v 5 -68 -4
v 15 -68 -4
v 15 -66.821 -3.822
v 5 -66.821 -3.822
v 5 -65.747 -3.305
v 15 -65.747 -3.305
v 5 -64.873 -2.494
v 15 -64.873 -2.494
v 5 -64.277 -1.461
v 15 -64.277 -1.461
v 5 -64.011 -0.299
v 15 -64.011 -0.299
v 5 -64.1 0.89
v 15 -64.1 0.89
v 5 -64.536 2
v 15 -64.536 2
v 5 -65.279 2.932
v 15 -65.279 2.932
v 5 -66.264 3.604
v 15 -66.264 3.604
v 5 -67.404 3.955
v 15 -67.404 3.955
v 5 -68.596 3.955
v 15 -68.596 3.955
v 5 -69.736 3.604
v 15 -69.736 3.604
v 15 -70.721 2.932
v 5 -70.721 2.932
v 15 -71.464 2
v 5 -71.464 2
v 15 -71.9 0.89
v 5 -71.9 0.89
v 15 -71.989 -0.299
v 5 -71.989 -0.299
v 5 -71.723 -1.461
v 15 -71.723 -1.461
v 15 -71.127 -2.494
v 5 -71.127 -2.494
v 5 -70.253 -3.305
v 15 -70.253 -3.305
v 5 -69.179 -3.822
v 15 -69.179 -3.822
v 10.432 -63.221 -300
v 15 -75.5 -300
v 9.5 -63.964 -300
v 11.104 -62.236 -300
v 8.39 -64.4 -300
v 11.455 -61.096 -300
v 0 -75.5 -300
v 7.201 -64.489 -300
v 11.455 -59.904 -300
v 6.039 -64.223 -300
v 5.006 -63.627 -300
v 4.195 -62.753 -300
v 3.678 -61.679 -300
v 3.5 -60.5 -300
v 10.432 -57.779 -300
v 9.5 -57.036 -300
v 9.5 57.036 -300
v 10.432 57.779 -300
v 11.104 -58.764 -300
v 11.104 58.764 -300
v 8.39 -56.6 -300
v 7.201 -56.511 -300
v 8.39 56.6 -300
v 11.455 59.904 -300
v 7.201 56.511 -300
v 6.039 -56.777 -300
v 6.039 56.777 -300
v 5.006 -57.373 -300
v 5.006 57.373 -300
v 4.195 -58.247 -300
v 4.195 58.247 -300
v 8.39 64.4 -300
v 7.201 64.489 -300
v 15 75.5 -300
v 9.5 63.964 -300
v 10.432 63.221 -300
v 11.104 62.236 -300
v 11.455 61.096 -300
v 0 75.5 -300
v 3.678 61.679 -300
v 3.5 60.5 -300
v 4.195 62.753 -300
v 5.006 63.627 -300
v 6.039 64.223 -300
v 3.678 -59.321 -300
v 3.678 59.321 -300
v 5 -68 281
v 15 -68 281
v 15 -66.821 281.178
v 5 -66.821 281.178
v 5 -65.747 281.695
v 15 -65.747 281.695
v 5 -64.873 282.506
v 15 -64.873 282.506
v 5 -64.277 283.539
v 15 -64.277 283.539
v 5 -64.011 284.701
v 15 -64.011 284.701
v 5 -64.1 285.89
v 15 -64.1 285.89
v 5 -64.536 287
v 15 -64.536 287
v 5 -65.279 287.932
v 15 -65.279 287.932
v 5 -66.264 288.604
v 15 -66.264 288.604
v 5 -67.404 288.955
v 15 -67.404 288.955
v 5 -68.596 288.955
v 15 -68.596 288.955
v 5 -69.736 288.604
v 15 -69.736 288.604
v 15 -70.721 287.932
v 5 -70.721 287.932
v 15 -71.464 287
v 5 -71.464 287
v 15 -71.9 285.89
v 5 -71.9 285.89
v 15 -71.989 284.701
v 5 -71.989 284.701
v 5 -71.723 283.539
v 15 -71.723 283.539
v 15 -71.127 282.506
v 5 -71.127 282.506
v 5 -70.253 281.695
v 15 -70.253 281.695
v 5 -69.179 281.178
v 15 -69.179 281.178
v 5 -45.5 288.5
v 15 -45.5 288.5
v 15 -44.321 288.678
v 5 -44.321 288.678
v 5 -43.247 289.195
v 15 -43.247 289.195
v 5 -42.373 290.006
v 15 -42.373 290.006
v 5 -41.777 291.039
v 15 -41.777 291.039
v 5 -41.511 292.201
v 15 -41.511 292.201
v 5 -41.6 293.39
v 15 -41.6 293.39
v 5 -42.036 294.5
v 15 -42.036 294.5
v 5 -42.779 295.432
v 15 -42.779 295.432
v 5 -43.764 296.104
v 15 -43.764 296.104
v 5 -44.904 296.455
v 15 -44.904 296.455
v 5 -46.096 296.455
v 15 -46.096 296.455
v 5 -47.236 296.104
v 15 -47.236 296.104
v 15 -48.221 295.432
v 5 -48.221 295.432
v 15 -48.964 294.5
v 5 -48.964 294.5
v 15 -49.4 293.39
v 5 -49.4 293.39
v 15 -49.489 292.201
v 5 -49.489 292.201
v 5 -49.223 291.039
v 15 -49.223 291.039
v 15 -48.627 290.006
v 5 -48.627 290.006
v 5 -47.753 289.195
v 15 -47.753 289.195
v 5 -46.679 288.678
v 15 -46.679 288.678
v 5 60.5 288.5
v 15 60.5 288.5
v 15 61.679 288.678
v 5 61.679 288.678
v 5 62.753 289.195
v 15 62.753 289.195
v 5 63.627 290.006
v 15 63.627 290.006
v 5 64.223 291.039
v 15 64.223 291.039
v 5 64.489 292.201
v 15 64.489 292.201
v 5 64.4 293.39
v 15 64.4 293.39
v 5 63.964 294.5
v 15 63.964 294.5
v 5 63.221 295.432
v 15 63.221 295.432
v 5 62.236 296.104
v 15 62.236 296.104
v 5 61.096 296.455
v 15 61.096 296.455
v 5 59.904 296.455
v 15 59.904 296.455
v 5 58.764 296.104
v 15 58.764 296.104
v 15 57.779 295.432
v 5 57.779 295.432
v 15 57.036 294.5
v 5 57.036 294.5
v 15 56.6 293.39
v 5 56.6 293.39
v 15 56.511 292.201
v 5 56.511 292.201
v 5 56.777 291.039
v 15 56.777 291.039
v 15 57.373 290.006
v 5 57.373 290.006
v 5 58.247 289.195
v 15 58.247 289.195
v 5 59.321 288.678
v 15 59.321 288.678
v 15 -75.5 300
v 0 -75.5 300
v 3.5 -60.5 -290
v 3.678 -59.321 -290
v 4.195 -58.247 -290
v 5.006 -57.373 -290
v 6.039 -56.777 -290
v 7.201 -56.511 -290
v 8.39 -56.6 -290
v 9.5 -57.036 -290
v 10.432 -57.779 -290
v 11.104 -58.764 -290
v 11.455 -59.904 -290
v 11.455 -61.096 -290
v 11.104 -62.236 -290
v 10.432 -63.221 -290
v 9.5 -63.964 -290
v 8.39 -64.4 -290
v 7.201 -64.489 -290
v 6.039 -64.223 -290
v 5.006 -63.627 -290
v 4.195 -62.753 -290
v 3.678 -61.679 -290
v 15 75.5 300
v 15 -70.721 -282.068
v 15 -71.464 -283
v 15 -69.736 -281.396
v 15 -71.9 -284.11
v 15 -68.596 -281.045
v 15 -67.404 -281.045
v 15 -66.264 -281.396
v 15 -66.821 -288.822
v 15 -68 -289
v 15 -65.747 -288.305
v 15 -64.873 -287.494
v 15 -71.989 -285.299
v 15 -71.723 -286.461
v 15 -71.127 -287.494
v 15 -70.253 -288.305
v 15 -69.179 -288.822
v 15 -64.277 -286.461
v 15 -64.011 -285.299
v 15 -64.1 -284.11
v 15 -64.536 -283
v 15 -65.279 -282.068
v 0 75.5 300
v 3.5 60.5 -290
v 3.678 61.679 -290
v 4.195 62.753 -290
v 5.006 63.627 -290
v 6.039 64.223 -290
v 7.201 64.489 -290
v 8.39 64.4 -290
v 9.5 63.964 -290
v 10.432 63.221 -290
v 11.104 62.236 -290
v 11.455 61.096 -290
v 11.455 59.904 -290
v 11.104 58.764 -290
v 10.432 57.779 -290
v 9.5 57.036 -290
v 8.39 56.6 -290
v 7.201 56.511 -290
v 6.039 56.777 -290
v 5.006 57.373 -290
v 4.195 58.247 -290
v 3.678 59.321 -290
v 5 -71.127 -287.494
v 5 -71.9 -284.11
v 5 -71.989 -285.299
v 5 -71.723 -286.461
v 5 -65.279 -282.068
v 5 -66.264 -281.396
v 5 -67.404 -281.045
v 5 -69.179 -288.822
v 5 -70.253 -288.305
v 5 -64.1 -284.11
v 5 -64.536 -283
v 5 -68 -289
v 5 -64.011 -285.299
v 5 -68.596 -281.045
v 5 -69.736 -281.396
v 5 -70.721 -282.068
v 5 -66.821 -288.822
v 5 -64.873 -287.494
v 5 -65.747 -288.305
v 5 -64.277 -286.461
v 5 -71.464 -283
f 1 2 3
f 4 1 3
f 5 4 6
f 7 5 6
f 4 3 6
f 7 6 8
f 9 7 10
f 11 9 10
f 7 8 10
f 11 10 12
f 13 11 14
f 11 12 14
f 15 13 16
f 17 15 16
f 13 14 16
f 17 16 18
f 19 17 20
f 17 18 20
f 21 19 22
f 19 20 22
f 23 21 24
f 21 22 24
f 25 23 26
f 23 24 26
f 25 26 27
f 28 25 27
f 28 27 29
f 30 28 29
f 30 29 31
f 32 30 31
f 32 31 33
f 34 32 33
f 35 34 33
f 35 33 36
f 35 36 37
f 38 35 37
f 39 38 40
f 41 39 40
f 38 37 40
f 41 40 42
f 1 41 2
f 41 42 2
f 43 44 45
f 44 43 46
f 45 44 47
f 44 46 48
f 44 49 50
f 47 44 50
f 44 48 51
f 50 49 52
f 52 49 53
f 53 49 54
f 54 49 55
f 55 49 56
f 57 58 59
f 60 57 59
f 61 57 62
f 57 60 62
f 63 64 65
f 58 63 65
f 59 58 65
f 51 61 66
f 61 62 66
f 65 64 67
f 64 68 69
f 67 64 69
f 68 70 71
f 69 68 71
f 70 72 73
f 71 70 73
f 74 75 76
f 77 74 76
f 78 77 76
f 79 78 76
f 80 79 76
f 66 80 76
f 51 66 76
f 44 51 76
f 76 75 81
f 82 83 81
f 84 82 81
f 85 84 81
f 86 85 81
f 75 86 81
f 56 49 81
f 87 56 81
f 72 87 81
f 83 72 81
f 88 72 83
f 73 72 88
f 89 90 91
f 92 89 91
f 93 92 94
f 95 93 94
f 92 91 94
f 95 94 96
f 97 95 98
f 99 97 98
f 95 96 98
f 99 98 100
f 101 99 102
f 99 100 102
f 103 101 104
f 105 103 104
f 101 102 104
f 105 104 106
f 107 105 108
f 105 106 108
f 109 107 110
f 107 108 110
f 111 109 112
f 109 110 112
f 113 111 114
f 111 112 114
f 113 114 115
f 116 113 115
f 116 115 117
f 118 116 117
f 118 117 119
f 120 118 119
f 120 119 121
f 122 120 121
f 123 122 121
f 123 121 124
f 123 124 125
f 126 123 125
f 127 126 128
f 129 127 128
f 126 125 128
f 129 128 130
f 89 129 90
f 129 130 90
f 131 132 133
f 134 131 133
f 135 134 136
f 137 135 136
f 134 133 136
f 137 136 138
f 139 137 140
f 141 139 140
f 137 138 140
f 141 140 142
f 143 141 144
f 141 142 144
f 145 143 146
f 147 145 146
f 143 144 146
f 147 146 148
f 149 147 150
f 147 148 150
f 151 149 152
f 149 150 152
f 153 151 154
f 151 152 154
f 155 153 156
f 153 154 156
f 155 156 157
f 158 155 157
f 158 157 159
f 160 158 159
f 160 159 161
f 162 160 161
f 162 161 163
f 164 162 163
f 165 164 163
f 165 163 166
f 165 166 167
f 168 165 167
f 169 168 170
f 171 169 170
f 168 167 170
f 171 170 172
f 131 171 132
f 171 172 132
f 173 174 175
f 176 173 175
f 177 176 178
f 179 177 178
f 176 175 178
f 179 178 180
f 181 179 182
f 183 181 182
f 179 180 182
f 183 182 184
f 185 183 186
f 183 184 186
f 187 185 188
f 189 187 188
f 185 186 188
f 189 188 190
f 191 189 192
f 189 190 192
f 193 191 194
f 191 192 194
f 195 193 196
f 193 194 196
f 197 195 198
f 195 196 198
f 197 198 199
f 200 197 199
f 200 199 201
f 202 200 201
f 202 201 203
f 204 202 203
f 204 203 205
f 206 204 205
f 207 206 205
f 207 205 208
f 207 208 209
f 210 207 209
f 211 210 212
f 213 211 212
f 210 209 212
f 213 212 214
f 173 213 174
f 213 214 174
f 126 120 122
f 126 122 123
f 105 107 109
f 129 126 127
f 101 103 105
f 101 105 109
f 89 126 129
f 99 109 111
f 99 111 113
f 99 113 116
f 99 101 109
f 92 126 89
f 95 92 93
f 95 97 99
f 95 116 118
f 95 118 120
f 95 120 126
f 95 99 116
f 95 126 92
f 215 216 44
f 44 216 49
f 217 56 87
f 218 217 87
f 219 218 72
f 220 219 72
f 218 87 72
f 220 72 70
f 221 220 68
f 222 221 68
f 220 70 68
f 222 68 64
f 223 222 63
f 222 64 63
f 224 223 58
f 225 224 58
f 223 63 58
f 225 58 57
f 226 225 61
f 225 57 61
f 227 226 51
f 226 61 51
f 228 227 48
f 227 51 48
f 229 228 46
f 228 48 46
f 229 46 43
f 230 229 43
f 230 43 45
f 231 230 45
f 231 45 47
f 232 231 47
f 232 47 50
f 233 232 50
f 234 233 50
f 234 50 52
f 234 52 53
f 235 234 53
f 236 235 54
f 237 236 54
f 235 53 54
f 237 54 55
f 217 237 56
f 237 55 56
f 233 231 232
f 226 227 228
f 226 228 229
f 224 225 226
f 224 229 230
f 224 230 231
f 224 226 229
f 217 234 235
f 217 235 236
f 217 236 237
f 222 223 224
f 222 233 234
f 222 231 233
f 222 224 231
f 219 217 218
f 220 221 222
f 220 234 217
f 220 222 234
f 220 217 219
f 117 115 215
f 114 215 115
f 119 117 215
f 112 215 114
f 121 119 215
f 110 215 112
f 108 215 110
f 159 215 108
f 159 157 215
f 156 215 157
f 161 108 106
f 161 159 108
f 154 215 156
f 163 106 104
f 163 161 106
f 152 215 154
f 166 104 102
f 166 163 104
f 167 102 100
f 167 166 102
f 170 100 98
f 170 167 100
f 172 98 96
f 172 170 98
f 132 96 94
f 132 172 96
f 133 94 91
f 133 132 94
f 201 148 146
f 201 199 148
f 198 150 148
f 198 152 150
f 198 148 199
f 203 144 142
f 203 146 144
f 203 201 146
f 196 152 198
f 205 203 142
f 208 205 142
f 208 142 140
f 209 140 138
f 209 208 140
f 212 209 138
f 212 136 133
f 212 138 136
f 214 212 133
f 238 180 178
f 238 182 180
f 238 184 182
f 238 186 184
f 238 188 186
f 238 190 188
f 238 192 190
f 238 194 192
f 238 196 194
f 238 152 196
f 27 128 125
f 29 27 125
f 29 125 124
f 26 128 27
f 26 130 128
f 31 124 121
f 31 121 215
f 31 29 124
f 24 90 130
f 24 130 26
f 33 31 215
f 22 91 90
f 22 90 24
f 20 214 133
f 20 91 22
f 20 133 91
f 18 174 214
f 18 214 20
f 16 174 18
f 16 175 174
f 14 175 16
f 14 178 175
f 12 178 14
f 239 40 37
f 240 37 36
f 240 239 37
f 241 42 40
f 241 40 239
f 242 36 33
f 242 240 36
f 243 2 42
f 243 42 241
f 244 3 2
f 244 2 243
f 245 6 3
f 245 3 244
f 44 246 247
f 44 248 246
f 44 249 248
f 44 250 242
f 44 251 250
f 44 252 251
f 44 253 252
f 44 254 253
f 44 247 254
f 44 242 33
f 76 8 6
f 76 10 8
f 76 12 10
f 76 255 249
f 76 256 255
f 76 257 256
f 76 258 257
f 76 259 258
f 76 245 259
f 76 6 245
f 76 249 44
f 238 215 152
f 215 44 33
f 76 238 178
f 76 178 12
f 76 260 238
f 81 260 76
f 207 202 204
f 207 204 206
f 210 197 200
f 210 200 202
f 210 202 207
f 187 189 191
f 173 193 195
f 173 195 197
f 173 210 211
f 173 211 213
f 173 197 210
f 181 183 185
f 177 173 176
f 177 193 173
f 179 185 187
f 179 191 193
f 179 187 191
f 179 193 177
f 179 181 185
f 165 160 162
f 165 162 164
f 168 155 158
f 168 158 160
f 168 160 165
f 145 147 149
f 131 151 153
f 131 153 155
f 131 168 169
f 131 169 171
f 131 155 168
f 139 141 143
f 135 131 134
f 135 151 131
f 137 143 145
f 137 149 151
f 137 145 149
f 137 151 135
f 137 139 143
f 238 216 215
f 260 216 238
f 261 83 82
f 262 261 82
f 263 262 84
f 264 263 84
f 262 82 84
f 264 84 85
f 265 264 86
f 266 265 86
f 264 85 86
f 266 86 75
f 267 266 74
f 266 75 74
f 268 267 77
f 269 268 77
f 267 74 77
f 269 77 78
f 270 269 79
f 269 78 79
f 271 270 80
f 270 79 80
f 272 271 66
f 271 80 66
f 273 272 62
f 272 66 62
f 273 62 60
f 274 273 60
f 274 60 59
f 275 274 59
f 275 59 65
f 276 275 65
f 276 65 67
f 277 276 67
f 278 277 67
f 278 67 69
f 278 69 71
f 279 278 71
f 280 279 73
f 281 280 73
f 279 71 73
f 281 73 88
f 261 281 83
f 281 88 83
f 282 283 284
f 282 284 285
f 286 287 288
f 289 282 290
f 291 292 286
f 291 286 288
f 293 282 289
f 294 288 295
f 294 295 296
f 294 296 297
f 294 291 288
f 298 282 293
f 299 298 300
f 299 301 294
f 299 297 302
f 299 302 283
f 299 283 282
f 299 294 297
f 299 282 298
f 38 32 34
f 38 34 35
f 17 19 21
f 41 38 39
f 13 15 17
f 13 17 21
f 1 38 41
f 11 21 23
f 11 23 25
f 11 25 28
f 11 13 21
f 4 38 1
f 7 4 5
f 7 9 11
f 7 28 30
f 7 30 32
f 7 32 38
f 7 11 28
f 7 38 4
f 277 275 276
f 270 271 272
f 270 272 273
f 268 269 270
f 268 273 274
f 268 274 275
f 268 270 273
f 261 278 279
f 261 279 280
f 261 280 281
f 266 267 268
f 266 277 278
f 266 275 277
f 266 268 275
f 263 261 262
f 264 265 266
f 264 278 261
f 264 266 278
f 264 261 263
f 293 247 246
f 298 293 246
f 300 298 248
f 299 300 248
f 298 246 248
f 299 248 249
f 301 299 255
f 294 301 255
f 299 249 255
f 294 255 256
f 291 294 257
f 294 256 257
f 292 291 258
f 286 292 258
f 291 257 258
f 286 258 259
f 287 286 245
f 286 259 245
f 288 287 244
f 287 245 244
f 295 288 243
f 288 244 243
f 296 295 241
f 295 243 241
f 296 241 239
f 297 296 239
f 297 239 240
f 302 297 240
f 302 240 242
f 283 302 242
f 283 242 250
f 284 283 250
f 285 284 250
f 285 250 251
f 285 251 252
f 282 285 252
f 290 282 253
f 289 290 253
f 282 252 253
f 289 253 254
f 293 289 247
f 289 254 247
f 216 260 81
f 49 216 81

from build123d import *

# Parameters (mm, degrees)
SKETCH1_W           = 600
SKETCH1_H           = 151
BOSS_EXTRUDE1_DEPTH = 15
SKETCH2_R           = 4
CUT_EXTRUDE1_DEPTH  = 10
SKETCH2_3_R         = 4
CUT_EXTRUDE2_DEPTH  = 10
LPATTERN1_COUNT     = 3
LPATTERN1_PITCH     = 285
LPATTERN2_COUNT     = 2
LPATTERN2_PITCH     = 106
SKETCH5_R           = 4
CUT_EXTRUDE5_DEPTH  = 10
LPATTERN5_COUNT     = 2
LPATTERN5_PITCH     = 121


with BuildPart() as part:
    # Sketch1 → Boss-Extrude1 (new body)
    with BuildSketch(Plane(origin=(0, 0, 0), x_dir=(0, 0, -1), z_dir=(1, 0, 0))):
        Rectangle(SKETCH1_W, SKETCH1_H)
    extrude(amount=BOSS_EXTRUDE1_DEPTH)

    # Sketch2 → Cut-Extrude1 (cut)
    with BuildSketch(Plane(origin=(15, 0, 0), x_dir=(0, 0, -1), z_dir=(1, 0, 0))):
        with Locations((285, -68)):
            Circle(SKETCH2_R)
    cut_extrude1 = extrude(amount=-CUT_EXTRUDE1_DEPTH, mode=Mode.SUBTRACT)

    # Sketch2<3> → Cut-Extrude2 (cut)
    with BuildSketch(Plane(origin=(15, 0, 0), x_dir=(0, 0, -1), z_dir=(1, 0, 0))):
        with Locations((-292.5, 60.5)):
            Circle(SKETCH2_3_R)
    cut_extrude2 = extrude(amount=-CUT_EXTRUDE2_DEPTH, mode=Mode.SUBTRACT)

    # LPattern1: Cut-Extrude1 ×3
    with Locations(*[(0, 0, i * LPATTERN1_PITCH) for i in range(1, LPATTERN1_COUNT)]):
        add(cut_extrude1, mode=Mode.SUBTRACT)

    # LPattern2: Cut-Extrude2 ×2
    with Locations(*[(0, -i * LPATTERN2_PITCH, 0) for i in range(1, LPATTERN2_COUNT)]):
        add(cut_extrude2, mode=Mode.SUBTRACT)

    # Sketch5 → Cut-Extrude5 (cut)
    with BuildSketch(Plane(origin=(0, 0, -300), x_dir=(-1, 0, 0), z_dir=(0, 0, -1))):
        with Locations((-7.5, 60.5)):
            Circle(SKETCH5_R)
    cut_extrude5 = extrude(amount=-CUT_EXTRUDE5_DEPTH, mode=Mode.SUBTRACT)

    # LPattern5: Cut-Extrude5 ×2
    with Locations(*[(0, -i * LPATTERN5_PITCH, 0) for i in range(1, LPATTERN5_COUNT)]):
        add(cut_extrude5, mode=Mode.SUBTRACT)


solid = part.part
